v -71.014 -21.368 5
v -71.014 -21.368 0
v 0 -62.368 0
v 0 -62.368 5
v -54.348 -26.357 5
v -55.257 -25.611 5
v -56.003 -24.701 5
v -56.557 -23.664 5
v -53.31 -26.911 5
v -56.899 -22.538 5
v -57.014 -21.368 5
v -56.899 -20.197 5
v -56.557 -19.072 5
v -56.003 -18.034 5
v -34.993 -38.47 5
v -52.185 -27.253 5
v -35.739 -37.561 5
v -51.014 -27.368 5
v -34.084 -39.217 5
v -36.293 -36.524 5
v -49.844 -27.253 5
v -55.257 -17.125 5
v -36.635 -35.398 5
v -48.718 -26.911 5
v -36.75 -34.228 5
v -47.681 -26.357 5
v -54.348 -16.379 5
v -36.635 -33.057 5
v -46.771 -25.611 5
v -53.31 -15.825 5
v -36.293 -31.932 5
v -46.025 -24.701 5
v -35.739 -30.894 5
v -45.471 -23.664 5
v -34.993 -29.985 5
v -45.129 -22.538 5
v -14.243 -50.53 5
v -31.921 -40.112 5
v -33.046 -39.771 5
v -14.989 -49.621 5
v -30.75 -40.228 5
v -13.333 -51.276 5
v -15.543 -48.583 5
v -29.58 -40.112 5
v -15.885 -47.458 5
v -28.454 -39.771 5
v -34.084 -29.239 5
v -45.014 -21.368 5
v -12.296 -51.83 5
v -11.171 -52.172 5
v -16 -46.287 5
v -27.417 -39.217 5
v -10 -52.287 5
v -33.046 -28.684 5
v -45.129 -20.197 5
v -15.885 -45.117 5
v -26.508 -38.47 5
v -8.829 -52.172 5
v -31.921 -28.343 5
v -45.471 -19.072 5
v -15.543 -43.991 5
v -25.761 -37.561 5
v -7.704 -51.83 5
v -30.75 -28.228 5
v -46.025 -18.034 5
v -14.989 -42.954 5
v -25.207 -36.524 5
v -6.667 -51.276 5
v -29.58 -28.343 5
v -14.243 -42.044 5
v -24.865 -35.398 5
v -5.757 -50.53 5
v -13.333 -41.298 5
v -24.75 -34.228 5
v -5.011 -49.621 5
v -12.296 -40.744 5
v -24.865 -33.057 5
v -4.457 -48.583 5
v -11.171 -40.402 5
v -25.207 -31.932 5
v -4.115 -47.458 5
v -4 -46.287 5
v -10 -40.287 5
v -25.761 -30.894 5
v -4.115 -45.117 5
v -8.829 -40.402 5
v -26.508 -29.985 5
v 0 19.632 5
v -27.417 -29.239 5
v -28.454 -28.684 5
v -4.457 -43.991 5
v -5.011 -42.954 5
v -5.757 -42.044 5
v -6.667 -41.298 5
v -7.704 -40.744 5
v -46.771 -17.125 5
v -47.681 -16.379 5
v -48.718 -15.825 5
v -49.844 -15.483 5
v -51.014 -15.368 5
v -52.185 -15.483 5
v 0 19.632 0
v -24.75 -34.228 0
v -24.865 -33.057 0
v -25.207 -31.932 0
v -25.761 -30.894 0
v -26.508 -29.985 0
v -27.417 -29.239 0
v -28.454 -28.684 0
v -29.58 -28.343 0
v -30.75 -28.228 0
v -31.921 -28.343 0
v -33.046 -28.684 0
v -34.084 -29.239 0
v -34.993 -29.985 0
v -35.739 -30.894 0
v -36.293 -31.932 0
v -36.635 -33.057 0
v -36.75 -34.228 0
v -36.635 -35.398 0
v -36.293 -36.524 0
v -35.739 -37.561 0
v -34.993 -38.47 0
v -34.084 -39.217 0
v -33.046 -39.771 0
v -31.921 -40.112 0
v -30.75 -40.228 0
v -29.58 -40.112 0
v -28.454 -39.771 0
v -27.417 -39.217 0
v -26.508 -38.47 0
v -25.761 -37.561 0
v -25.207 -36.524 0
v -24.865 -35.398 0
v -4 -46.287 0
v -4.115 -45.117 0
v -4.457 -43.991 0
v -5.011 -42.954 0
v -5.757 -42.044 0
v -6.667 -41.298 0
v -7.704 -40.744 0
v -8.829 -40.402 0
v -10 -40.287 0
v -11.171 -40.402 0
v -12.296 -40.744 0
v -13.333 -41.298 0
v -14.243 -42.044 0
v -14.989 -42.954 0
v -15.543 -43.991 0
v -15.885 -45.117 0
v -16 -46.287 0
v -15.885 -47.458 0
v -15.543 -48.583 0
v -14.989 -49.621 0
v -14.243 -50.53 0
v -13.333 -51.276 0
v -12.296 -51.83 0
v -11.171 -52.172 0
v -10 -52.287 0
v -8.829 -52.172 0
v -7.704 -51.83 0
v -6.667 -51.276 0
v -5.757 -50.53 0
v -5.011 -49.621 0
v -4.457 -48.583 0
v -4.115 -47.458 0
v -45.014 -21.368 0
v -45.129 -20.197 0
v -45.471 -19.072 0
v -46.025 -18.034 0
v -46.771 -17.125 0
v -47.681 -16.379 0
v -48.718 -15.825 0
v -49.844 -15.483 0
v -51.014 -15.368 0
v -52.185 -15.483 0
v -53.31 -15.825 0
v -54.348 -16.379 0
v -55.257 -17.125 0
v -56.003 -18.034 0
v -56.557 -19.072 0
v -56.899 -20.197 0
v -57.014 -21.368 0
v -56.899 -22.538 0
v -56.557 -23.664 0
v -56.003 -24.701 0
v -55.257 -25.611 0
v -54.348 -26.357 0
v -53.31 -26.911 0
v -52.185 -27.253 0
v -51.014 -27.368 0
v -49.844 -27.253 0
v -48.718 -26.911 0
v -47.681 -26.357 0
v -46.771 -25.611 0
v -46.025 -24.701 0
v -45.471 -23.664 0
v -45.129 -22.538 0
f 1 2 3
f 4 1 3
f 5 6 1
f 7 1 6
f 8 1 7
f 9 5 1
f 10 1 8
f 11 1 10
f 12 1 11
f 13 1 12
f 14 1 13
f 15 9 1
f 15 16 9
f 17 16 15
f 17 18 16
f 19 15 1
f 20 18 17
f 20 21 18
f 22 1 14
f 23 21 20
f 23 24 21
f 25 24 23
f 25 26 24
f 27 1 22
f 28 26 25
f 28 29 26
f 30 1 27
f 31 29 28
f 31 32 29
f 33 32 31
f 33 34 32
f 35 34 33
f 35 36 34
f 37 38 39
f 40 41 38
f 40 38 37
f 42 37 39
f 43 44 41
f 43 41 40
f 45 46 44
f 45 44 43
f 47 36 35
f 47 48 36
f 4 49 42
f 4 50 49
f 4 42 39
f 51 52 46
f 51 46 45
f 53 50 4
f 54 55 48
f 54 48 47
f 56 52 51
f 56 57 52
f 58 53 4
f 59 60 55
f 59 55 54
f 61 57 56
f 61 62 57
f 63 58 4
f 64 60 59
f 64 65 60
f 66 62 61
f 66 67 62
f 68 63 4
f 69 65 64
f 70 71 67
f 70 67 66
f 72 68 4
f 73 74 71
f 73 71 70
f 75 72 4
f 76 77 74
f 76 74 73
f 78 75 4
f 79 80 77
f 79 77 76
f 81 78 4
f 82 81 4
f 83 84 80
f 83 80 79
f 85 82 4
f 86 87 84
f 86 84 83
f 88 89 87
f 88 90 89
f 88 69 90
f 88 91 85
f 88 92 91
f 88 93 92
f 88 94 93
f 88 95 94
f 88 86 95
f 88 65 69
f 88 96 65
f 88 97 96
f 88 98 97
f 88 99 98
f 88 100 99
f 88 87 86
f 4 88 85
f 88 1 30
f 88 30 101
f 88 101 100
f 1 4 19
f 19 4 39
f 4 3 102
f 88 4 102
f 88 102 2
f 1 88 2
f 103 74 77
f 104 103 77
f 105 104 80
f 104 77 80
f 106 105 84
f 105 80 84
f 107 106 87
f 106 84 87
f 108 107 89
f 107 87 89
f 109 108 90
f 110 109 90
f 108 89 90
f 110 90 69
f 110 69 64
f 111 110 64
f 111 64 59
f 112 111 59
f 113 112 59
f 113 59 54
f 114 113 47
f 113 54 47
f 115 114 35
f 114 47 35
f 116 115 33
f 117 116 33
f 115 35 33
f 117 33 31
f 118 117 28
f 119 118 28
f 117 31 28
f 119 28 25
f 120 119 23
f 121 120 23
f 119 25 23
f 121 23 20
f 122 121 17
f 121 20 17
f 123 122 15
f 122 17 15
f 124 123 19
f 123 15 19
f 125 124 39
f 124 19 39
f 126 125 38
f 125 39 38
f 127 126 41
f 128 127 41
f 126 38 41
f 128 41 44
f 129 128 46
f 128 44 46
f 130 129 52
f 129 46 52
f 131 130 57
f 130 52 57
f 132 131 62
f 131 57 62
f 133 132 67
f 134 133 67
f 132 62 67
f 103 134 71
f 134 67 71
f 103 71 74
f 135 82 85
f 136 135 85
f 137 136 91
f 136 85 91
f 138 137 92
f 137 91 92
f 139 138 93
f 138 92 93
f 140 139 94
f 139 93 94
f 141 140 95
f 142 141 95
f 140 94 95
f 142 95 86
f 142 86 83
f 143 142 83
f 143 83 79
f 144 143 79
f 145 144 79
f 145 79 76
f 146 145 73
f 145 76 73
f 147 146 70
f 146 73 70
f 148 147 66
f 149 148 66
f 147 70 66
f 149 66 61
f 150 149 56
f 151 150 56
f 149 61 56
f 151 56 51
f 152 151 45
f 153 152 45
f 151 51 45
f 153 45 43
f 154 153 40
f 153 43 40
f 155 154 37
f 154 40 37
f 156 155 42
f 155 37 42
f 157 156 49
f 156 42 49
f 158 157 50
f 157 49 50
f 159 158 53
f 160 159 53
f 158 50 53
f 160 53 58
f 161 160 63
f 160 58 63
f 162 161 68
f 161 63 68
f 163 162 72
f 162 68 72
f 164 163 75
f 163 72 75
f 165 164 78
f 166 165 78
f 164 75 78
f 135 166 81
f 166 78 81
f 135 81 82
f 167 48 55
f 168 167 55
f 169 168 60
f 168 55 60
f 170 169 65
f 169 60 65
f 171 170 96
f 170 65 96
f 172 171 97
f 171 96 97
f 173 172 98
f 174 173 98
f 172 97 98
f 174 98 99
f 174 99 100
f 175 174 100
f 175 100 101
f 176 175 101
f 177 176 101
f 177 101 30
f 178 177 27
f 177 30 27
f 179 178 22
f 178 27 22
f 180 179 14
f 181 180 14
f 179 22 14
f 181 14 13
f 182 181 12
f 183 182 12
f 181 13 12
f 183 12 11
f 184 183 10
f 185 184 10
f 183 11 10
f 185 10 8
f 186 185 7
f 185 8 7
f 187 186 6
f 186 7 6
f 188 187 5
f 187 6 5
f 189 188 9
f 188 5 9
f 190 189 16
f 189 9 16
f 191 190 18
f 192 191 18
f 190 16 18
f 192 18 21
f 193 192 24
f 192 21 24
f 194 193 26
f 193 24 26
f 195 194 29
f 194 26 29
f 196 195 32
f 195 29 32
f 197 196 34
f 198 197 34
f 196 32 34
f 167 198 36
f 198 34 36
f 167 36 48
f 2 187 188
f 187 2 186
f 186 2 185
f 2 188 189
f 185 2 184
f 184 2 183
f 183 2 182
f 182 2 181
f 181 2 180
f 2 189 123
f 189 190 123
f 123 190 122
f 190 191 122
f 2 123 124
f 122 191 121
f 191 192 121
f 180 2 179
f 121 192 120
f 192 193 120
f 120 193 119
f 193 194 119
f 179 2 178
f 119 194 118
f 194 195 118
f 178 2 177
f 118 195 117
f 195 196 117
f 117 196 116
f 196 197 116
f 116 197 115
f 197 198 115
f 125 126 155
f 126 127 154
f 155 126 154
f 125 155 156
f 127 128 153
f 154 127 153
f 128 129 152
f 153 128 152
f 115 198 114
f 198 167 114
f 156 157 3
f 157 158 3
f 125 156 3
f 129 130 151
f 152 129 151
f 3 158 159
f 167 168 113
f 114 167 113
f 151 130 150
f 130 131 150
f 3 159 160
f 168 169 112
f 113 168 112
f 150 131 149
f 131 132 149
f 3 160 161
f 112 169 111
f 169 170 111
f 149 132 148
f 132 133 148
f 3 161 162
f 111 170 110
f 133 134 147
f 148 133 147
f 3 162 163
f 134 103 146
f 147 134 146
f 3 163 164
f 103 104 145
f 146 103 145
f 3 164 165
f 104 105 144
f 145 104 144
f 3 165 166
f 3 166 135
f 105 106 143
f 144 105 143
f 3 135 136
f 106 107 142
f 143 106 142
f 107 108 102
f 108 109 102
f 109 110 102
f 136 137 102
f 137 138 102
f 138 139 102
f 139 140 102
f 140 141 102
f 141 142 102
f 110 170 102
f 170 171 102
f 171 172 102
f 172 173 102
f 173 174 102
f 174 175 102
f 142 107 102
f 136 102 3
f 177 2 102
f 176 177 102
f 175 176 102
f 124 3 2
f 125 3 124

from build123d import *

# Parameters (mm, degrees)
F1_DEPTH = 5
F2_R     = 6
F3_DEPTH = 5


with BuildPart() as f1:
    # F0 (on Top) → F1 (new body)
    with BuildSketch(Plane.XY):
        Polygon((0, -62.367893), (0, 19.632107), (-71.014083, -21.367893), align=None)
    extrude(amount=F1_DEPTH)

    # F2 (on face) → F3 (cut, through all)
    with BuildSketch(Plane.XY.offset(5)):
        with Locations((-51.014083, -21.367893)):
            Circle(F2_R)
        with Locations((-30.750196, -34.227709)):
            Circle(F2_R)
        with Locations((-10, -46.287119)):
            Circle(F2_R)
    extrude(amount=-F3_DEPTH, mode=Mode.SUBTRACT)


solid = f1.part
